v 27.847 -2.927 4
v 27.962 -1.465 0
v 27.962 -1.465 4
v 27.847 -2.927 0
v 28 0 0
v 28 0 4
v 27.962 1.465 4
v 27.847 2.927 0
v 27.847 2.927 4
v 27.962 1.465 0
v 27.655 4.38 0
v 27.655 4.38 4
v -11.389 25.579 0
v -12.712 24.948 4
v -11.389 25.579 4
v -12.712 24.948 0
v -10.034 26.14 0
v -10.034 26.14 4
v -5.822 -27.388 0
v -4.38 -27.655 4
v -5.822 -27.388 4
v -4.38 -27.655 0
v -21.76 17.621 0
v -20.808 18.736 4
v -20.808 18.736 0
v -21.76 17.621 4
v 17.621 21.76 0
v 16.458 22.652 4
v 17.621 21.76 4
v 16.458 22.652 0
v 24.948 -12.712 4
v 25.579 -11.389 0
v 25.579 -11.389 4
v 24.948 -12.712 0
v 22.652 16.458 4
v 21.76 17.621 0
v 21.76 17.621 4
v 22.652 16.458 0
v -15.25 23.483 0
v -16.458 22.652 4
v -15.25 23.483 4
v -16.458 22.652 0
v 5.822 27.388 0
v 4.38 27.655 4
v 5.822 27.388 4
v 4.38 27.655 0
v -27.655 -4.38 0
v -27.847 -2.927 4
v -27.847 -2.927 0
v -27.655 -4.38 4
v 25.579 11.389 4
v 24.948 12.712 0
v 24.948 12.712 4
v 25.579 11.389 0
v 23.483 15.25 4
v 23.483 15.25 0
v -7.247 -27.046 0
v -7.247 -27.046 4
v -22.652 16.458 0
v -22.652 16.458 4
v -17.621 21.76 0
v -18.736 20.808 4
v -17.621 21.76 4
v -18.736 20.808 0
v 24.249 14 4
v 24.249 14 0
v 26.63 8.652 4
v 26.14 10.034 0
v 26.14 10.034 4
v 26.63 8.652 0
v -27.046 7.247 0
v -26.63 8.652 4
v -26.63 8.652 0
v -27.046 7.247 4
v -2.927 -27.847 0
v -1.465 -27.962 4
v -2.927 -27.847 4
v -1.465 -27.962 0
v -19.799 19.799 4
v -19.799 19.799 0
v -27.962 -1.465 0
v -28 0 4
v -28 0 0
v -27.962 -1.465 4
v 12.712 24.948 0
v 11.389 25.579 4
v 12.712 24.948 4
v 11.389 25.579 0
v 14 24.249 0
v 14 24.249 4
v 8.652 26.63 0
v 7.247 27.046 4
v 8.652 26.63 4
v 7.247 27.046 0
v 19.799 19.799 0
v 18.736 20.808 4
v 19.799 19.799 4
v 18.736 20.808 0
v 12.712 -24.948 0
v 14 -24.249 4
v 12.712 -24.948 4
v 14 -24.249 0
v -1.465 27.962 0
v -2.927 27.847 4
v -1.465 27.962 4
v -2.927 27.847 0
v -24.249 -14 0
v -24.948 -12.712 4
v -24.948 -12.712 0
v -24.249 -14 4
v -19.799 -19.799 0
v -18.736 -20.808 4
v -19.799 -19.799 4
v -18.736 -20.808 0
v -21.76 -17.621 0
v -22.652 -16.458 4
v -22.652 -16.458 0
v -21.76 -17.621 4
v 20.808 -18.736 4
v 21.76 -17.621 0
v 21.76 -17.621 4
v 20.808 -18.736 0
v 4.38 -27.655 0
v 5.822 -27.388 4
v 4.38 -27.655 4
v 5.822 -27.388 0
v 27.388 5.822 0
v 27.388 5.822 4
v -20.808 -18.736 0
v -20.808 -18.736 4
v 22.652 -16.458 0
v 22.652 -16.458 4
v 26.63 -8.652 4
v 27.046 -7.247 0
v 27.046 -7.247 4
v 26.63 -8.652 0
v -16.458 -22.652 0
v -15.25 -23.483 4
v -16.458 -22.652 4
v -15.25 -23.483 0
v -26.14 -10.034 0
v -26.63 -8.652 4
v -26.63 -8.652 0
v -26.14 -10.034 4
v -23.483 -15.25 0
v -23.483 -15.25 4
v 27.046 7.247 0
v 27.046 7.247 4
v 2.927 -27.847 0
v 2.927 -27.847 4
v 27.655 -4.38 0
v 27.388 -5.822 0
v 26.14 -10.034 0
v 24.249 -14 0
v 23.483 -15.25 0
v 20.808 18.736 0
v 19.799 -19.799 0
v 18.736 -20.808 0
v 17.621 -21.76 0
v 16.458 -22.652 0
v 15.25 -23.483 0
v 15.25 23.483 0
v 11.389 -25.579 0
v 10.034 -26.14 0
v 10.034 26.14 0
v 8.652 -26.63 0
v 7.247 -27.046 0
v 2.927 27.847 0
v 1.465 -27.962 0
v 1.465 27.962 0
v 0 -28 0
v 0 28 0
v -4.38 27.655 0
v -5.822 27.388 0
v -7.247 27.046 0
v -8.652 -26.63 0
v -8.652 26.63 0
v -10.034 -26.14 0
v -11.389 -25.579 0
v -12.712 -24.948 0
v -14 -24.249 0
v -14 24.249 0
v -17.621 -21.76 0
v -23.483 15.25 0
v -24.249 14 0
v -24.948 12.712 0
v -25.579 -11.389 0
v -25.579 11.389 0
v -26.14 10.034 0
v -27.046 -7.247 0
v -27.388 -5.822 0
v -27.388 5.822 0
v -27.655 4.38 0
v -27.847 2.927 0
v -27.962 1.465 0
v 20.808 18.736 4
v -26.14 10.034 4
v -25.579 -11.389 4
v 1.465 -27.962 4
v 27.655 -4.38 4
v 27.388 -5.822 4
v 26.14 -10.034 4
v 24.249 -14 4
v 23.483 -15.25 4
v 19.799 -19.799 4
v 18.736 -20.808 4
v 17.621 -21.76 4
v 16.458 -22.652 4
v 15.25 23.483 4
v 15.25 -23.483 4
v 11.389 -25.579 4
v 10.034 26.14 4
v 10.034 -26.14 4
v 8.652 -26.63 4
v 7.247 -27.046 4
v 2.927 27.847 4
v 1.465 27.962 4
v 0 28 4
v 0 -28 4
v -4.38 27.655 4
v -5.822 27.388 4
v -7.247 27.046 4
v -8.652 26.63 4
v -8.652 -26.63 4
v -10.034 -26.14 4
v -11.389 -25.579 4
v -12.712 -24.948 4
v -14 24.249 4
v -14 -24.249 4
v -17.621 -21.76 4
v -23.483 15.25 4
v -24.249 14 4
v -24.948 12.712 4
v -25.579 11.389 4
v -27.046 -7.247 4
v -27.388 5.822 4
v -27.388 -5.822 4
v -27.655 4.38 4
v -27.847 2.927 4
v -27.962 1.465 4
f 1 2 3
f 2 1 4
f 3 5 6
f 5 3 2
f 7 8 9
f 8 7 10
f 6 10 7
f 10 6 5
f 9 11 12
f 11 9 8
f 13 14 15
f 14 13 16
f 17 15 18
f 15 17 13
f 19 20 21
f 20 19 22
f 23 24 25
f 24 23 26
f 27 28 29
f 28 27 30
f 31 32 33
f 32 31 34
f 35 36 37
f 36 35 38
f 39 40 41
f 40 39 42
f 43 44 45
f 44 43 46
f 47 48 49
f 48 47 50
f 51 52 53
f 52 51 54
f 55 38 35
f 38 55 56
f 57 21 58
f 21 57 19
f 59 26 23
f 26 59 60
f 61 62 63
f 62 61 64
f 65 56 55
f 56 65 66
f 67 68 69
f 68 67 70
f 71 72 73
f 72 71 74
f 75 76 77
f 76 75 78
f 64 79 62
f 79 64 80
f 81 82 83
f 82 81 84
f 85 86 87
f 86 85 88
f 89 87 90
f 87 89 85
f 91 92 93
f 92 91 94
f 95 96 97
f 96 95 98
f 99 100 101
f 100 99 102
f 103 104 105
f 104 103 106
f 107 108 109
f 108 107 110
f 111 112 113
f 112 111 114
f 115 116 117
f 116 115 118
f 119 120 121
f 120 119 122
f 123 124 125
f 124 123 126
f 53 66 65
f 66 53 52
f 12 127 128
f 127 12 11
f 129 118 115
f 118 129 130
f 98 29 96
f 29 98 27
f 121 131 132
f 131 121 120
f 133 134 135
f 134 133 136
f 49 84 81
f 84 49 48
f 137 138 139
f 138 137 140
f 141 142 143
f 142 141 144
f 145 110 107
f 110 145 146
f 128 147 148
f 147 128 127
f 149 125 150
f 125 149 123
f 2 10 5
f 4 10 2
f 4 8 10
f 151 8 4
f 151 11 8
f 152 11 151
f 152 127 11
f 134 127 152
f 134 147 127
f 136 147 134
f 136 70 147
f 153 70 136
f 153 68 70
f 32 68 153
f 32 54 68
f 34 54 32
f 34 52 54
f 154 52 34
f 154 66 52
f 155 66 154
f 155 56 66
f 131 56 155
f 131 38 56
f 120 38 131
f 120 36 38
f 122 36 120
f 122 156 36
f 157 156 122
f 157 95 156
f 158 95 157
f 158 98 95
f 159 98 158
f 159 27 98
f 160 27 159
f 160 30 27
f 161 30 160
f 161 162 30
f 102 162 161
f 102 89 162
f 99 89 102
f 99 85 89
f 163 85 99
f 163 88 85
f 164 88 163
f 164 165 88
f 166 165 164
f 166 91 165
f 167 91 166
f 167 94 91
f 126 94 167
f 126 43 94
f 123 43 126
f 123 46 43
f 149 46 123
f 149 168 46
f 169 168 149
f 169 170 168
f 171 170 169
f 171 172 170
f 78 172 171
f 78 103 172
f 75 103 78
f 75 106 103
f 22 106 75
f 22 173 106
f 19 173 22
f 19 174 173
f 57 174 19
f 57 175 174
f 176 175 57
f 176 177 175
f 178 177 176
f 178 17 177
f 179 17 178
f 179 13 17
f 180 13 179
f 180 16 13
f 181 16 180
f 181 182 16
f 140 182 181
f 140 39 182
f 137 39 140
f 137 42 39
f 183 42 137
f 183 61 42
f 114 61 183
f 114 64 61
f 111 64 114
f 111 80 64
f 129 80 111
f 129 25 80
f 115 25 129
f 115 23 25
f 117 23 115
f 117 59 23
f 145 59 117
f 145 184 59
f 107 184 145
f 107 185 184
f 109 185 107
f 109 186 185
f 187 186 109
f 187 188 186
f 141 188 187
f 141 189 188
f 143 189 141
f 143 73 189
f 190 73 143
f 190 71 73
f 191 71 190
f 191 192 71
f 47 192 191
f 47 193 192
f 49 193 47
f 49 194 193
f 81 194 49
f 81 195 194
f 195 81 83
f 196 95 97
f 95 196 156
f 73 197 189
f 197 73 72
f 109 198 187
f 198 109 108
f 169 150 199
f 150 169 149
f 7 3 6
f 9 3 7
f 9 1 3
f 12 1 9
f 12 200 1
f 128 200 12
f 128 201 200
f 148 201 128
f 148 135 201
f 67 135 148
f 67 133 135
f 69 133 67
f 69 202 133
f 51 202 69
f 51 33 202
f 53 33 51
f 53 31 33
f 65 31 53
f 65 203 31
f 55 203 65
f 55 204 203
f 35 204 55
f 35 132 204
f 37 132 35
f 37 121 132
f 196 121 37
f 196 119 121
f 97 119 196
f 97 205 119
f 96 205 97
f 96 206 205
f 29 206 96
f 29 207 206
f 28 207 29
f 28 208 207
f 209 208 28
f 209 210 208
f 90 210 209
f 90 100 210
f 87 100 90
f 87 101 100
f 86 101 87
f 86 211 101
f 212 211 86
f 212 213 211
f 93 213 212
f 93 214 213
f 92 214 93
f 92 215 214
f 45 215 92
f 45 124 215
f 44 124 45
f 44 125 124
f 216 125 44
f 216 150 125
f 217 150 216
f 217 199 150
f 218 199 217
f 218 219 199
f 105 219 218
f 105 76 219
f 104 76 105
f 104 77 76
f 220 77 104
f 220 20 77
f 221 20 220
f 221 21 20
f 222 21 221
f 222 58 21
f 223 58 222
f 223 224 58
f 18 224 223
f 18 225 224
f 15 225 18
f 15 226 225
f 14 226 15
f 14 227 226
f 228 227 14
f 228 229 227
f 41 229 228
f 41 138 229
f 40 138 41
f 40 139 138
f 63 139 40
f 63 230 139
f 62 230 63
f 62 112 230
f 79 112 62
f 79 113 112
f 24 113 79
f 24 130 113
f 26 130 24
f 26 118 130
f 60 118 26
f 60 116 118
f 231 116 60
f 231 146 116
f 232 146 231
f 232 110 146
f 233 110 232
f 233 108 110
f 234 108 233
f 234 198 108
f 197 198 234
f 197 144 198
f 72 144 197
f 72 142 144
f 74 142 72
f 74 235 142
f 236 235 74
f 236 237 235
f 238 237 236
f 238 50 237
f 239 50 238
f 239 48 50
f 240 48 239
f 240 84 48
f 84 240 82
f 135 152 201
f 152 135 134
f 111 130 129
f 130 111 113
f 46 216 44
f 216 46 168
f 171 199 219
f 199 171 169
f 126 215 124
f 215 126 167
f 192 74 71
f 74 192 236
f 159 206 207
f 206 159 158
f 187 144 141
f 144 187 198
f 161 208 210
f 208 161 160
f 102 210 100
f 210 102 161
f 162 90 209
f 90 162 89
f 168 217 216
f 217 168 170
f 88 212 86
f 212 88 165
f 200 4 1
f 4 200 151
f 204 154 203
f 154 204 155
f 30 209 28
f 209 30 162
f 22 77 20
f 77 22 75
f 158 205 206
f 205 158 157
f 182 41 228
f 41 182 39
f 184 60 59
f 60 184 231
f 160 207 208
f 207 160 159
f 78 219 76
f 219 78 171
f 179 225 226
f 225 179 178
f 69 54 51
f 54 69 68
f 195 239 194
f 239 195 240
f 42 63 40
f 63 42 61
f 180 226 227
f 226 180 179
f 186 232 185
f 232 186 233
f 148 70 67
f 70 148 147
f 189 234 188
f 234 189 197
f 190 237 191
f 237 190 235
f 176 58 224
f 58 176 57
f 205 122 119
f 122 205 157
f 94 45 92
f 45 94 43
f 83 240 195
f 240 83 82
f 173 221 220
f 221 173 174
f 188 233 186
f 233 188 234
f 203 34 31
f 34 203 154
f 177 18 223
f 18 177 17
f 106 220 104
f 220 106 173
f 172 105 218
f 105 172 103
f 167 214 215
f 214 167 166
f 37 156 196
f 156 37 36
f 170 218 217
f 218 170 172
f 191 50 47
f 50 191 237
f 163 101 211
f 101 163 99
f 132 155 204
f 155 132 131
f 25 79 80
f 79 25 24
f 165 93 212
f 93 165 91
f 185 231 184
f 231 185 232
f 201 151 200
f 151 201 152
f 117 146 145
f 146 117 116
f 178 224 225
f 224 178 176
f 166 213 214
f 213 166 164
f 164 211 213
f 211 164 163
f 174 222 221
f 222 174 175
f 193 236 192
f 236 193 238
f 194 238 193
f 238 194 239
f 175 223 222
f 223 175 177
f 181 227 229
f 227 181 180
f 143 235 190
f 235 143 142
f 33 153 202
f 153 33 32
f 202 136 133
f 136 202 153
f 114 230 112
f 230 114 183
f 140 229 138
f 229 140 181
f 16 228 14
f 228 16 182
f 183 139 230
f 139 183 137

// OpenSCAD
/* Color merge: export two STLs or use modifiers to assign colors/materials */
module base(){
  cylinder(h=4, r=28, $fn=120);
}
module inlay(){
  translate([0,0,0.8]) linear_extrude(2.4) text("A", size=22, halign="center", valign="center");
}
base();
inlay();
